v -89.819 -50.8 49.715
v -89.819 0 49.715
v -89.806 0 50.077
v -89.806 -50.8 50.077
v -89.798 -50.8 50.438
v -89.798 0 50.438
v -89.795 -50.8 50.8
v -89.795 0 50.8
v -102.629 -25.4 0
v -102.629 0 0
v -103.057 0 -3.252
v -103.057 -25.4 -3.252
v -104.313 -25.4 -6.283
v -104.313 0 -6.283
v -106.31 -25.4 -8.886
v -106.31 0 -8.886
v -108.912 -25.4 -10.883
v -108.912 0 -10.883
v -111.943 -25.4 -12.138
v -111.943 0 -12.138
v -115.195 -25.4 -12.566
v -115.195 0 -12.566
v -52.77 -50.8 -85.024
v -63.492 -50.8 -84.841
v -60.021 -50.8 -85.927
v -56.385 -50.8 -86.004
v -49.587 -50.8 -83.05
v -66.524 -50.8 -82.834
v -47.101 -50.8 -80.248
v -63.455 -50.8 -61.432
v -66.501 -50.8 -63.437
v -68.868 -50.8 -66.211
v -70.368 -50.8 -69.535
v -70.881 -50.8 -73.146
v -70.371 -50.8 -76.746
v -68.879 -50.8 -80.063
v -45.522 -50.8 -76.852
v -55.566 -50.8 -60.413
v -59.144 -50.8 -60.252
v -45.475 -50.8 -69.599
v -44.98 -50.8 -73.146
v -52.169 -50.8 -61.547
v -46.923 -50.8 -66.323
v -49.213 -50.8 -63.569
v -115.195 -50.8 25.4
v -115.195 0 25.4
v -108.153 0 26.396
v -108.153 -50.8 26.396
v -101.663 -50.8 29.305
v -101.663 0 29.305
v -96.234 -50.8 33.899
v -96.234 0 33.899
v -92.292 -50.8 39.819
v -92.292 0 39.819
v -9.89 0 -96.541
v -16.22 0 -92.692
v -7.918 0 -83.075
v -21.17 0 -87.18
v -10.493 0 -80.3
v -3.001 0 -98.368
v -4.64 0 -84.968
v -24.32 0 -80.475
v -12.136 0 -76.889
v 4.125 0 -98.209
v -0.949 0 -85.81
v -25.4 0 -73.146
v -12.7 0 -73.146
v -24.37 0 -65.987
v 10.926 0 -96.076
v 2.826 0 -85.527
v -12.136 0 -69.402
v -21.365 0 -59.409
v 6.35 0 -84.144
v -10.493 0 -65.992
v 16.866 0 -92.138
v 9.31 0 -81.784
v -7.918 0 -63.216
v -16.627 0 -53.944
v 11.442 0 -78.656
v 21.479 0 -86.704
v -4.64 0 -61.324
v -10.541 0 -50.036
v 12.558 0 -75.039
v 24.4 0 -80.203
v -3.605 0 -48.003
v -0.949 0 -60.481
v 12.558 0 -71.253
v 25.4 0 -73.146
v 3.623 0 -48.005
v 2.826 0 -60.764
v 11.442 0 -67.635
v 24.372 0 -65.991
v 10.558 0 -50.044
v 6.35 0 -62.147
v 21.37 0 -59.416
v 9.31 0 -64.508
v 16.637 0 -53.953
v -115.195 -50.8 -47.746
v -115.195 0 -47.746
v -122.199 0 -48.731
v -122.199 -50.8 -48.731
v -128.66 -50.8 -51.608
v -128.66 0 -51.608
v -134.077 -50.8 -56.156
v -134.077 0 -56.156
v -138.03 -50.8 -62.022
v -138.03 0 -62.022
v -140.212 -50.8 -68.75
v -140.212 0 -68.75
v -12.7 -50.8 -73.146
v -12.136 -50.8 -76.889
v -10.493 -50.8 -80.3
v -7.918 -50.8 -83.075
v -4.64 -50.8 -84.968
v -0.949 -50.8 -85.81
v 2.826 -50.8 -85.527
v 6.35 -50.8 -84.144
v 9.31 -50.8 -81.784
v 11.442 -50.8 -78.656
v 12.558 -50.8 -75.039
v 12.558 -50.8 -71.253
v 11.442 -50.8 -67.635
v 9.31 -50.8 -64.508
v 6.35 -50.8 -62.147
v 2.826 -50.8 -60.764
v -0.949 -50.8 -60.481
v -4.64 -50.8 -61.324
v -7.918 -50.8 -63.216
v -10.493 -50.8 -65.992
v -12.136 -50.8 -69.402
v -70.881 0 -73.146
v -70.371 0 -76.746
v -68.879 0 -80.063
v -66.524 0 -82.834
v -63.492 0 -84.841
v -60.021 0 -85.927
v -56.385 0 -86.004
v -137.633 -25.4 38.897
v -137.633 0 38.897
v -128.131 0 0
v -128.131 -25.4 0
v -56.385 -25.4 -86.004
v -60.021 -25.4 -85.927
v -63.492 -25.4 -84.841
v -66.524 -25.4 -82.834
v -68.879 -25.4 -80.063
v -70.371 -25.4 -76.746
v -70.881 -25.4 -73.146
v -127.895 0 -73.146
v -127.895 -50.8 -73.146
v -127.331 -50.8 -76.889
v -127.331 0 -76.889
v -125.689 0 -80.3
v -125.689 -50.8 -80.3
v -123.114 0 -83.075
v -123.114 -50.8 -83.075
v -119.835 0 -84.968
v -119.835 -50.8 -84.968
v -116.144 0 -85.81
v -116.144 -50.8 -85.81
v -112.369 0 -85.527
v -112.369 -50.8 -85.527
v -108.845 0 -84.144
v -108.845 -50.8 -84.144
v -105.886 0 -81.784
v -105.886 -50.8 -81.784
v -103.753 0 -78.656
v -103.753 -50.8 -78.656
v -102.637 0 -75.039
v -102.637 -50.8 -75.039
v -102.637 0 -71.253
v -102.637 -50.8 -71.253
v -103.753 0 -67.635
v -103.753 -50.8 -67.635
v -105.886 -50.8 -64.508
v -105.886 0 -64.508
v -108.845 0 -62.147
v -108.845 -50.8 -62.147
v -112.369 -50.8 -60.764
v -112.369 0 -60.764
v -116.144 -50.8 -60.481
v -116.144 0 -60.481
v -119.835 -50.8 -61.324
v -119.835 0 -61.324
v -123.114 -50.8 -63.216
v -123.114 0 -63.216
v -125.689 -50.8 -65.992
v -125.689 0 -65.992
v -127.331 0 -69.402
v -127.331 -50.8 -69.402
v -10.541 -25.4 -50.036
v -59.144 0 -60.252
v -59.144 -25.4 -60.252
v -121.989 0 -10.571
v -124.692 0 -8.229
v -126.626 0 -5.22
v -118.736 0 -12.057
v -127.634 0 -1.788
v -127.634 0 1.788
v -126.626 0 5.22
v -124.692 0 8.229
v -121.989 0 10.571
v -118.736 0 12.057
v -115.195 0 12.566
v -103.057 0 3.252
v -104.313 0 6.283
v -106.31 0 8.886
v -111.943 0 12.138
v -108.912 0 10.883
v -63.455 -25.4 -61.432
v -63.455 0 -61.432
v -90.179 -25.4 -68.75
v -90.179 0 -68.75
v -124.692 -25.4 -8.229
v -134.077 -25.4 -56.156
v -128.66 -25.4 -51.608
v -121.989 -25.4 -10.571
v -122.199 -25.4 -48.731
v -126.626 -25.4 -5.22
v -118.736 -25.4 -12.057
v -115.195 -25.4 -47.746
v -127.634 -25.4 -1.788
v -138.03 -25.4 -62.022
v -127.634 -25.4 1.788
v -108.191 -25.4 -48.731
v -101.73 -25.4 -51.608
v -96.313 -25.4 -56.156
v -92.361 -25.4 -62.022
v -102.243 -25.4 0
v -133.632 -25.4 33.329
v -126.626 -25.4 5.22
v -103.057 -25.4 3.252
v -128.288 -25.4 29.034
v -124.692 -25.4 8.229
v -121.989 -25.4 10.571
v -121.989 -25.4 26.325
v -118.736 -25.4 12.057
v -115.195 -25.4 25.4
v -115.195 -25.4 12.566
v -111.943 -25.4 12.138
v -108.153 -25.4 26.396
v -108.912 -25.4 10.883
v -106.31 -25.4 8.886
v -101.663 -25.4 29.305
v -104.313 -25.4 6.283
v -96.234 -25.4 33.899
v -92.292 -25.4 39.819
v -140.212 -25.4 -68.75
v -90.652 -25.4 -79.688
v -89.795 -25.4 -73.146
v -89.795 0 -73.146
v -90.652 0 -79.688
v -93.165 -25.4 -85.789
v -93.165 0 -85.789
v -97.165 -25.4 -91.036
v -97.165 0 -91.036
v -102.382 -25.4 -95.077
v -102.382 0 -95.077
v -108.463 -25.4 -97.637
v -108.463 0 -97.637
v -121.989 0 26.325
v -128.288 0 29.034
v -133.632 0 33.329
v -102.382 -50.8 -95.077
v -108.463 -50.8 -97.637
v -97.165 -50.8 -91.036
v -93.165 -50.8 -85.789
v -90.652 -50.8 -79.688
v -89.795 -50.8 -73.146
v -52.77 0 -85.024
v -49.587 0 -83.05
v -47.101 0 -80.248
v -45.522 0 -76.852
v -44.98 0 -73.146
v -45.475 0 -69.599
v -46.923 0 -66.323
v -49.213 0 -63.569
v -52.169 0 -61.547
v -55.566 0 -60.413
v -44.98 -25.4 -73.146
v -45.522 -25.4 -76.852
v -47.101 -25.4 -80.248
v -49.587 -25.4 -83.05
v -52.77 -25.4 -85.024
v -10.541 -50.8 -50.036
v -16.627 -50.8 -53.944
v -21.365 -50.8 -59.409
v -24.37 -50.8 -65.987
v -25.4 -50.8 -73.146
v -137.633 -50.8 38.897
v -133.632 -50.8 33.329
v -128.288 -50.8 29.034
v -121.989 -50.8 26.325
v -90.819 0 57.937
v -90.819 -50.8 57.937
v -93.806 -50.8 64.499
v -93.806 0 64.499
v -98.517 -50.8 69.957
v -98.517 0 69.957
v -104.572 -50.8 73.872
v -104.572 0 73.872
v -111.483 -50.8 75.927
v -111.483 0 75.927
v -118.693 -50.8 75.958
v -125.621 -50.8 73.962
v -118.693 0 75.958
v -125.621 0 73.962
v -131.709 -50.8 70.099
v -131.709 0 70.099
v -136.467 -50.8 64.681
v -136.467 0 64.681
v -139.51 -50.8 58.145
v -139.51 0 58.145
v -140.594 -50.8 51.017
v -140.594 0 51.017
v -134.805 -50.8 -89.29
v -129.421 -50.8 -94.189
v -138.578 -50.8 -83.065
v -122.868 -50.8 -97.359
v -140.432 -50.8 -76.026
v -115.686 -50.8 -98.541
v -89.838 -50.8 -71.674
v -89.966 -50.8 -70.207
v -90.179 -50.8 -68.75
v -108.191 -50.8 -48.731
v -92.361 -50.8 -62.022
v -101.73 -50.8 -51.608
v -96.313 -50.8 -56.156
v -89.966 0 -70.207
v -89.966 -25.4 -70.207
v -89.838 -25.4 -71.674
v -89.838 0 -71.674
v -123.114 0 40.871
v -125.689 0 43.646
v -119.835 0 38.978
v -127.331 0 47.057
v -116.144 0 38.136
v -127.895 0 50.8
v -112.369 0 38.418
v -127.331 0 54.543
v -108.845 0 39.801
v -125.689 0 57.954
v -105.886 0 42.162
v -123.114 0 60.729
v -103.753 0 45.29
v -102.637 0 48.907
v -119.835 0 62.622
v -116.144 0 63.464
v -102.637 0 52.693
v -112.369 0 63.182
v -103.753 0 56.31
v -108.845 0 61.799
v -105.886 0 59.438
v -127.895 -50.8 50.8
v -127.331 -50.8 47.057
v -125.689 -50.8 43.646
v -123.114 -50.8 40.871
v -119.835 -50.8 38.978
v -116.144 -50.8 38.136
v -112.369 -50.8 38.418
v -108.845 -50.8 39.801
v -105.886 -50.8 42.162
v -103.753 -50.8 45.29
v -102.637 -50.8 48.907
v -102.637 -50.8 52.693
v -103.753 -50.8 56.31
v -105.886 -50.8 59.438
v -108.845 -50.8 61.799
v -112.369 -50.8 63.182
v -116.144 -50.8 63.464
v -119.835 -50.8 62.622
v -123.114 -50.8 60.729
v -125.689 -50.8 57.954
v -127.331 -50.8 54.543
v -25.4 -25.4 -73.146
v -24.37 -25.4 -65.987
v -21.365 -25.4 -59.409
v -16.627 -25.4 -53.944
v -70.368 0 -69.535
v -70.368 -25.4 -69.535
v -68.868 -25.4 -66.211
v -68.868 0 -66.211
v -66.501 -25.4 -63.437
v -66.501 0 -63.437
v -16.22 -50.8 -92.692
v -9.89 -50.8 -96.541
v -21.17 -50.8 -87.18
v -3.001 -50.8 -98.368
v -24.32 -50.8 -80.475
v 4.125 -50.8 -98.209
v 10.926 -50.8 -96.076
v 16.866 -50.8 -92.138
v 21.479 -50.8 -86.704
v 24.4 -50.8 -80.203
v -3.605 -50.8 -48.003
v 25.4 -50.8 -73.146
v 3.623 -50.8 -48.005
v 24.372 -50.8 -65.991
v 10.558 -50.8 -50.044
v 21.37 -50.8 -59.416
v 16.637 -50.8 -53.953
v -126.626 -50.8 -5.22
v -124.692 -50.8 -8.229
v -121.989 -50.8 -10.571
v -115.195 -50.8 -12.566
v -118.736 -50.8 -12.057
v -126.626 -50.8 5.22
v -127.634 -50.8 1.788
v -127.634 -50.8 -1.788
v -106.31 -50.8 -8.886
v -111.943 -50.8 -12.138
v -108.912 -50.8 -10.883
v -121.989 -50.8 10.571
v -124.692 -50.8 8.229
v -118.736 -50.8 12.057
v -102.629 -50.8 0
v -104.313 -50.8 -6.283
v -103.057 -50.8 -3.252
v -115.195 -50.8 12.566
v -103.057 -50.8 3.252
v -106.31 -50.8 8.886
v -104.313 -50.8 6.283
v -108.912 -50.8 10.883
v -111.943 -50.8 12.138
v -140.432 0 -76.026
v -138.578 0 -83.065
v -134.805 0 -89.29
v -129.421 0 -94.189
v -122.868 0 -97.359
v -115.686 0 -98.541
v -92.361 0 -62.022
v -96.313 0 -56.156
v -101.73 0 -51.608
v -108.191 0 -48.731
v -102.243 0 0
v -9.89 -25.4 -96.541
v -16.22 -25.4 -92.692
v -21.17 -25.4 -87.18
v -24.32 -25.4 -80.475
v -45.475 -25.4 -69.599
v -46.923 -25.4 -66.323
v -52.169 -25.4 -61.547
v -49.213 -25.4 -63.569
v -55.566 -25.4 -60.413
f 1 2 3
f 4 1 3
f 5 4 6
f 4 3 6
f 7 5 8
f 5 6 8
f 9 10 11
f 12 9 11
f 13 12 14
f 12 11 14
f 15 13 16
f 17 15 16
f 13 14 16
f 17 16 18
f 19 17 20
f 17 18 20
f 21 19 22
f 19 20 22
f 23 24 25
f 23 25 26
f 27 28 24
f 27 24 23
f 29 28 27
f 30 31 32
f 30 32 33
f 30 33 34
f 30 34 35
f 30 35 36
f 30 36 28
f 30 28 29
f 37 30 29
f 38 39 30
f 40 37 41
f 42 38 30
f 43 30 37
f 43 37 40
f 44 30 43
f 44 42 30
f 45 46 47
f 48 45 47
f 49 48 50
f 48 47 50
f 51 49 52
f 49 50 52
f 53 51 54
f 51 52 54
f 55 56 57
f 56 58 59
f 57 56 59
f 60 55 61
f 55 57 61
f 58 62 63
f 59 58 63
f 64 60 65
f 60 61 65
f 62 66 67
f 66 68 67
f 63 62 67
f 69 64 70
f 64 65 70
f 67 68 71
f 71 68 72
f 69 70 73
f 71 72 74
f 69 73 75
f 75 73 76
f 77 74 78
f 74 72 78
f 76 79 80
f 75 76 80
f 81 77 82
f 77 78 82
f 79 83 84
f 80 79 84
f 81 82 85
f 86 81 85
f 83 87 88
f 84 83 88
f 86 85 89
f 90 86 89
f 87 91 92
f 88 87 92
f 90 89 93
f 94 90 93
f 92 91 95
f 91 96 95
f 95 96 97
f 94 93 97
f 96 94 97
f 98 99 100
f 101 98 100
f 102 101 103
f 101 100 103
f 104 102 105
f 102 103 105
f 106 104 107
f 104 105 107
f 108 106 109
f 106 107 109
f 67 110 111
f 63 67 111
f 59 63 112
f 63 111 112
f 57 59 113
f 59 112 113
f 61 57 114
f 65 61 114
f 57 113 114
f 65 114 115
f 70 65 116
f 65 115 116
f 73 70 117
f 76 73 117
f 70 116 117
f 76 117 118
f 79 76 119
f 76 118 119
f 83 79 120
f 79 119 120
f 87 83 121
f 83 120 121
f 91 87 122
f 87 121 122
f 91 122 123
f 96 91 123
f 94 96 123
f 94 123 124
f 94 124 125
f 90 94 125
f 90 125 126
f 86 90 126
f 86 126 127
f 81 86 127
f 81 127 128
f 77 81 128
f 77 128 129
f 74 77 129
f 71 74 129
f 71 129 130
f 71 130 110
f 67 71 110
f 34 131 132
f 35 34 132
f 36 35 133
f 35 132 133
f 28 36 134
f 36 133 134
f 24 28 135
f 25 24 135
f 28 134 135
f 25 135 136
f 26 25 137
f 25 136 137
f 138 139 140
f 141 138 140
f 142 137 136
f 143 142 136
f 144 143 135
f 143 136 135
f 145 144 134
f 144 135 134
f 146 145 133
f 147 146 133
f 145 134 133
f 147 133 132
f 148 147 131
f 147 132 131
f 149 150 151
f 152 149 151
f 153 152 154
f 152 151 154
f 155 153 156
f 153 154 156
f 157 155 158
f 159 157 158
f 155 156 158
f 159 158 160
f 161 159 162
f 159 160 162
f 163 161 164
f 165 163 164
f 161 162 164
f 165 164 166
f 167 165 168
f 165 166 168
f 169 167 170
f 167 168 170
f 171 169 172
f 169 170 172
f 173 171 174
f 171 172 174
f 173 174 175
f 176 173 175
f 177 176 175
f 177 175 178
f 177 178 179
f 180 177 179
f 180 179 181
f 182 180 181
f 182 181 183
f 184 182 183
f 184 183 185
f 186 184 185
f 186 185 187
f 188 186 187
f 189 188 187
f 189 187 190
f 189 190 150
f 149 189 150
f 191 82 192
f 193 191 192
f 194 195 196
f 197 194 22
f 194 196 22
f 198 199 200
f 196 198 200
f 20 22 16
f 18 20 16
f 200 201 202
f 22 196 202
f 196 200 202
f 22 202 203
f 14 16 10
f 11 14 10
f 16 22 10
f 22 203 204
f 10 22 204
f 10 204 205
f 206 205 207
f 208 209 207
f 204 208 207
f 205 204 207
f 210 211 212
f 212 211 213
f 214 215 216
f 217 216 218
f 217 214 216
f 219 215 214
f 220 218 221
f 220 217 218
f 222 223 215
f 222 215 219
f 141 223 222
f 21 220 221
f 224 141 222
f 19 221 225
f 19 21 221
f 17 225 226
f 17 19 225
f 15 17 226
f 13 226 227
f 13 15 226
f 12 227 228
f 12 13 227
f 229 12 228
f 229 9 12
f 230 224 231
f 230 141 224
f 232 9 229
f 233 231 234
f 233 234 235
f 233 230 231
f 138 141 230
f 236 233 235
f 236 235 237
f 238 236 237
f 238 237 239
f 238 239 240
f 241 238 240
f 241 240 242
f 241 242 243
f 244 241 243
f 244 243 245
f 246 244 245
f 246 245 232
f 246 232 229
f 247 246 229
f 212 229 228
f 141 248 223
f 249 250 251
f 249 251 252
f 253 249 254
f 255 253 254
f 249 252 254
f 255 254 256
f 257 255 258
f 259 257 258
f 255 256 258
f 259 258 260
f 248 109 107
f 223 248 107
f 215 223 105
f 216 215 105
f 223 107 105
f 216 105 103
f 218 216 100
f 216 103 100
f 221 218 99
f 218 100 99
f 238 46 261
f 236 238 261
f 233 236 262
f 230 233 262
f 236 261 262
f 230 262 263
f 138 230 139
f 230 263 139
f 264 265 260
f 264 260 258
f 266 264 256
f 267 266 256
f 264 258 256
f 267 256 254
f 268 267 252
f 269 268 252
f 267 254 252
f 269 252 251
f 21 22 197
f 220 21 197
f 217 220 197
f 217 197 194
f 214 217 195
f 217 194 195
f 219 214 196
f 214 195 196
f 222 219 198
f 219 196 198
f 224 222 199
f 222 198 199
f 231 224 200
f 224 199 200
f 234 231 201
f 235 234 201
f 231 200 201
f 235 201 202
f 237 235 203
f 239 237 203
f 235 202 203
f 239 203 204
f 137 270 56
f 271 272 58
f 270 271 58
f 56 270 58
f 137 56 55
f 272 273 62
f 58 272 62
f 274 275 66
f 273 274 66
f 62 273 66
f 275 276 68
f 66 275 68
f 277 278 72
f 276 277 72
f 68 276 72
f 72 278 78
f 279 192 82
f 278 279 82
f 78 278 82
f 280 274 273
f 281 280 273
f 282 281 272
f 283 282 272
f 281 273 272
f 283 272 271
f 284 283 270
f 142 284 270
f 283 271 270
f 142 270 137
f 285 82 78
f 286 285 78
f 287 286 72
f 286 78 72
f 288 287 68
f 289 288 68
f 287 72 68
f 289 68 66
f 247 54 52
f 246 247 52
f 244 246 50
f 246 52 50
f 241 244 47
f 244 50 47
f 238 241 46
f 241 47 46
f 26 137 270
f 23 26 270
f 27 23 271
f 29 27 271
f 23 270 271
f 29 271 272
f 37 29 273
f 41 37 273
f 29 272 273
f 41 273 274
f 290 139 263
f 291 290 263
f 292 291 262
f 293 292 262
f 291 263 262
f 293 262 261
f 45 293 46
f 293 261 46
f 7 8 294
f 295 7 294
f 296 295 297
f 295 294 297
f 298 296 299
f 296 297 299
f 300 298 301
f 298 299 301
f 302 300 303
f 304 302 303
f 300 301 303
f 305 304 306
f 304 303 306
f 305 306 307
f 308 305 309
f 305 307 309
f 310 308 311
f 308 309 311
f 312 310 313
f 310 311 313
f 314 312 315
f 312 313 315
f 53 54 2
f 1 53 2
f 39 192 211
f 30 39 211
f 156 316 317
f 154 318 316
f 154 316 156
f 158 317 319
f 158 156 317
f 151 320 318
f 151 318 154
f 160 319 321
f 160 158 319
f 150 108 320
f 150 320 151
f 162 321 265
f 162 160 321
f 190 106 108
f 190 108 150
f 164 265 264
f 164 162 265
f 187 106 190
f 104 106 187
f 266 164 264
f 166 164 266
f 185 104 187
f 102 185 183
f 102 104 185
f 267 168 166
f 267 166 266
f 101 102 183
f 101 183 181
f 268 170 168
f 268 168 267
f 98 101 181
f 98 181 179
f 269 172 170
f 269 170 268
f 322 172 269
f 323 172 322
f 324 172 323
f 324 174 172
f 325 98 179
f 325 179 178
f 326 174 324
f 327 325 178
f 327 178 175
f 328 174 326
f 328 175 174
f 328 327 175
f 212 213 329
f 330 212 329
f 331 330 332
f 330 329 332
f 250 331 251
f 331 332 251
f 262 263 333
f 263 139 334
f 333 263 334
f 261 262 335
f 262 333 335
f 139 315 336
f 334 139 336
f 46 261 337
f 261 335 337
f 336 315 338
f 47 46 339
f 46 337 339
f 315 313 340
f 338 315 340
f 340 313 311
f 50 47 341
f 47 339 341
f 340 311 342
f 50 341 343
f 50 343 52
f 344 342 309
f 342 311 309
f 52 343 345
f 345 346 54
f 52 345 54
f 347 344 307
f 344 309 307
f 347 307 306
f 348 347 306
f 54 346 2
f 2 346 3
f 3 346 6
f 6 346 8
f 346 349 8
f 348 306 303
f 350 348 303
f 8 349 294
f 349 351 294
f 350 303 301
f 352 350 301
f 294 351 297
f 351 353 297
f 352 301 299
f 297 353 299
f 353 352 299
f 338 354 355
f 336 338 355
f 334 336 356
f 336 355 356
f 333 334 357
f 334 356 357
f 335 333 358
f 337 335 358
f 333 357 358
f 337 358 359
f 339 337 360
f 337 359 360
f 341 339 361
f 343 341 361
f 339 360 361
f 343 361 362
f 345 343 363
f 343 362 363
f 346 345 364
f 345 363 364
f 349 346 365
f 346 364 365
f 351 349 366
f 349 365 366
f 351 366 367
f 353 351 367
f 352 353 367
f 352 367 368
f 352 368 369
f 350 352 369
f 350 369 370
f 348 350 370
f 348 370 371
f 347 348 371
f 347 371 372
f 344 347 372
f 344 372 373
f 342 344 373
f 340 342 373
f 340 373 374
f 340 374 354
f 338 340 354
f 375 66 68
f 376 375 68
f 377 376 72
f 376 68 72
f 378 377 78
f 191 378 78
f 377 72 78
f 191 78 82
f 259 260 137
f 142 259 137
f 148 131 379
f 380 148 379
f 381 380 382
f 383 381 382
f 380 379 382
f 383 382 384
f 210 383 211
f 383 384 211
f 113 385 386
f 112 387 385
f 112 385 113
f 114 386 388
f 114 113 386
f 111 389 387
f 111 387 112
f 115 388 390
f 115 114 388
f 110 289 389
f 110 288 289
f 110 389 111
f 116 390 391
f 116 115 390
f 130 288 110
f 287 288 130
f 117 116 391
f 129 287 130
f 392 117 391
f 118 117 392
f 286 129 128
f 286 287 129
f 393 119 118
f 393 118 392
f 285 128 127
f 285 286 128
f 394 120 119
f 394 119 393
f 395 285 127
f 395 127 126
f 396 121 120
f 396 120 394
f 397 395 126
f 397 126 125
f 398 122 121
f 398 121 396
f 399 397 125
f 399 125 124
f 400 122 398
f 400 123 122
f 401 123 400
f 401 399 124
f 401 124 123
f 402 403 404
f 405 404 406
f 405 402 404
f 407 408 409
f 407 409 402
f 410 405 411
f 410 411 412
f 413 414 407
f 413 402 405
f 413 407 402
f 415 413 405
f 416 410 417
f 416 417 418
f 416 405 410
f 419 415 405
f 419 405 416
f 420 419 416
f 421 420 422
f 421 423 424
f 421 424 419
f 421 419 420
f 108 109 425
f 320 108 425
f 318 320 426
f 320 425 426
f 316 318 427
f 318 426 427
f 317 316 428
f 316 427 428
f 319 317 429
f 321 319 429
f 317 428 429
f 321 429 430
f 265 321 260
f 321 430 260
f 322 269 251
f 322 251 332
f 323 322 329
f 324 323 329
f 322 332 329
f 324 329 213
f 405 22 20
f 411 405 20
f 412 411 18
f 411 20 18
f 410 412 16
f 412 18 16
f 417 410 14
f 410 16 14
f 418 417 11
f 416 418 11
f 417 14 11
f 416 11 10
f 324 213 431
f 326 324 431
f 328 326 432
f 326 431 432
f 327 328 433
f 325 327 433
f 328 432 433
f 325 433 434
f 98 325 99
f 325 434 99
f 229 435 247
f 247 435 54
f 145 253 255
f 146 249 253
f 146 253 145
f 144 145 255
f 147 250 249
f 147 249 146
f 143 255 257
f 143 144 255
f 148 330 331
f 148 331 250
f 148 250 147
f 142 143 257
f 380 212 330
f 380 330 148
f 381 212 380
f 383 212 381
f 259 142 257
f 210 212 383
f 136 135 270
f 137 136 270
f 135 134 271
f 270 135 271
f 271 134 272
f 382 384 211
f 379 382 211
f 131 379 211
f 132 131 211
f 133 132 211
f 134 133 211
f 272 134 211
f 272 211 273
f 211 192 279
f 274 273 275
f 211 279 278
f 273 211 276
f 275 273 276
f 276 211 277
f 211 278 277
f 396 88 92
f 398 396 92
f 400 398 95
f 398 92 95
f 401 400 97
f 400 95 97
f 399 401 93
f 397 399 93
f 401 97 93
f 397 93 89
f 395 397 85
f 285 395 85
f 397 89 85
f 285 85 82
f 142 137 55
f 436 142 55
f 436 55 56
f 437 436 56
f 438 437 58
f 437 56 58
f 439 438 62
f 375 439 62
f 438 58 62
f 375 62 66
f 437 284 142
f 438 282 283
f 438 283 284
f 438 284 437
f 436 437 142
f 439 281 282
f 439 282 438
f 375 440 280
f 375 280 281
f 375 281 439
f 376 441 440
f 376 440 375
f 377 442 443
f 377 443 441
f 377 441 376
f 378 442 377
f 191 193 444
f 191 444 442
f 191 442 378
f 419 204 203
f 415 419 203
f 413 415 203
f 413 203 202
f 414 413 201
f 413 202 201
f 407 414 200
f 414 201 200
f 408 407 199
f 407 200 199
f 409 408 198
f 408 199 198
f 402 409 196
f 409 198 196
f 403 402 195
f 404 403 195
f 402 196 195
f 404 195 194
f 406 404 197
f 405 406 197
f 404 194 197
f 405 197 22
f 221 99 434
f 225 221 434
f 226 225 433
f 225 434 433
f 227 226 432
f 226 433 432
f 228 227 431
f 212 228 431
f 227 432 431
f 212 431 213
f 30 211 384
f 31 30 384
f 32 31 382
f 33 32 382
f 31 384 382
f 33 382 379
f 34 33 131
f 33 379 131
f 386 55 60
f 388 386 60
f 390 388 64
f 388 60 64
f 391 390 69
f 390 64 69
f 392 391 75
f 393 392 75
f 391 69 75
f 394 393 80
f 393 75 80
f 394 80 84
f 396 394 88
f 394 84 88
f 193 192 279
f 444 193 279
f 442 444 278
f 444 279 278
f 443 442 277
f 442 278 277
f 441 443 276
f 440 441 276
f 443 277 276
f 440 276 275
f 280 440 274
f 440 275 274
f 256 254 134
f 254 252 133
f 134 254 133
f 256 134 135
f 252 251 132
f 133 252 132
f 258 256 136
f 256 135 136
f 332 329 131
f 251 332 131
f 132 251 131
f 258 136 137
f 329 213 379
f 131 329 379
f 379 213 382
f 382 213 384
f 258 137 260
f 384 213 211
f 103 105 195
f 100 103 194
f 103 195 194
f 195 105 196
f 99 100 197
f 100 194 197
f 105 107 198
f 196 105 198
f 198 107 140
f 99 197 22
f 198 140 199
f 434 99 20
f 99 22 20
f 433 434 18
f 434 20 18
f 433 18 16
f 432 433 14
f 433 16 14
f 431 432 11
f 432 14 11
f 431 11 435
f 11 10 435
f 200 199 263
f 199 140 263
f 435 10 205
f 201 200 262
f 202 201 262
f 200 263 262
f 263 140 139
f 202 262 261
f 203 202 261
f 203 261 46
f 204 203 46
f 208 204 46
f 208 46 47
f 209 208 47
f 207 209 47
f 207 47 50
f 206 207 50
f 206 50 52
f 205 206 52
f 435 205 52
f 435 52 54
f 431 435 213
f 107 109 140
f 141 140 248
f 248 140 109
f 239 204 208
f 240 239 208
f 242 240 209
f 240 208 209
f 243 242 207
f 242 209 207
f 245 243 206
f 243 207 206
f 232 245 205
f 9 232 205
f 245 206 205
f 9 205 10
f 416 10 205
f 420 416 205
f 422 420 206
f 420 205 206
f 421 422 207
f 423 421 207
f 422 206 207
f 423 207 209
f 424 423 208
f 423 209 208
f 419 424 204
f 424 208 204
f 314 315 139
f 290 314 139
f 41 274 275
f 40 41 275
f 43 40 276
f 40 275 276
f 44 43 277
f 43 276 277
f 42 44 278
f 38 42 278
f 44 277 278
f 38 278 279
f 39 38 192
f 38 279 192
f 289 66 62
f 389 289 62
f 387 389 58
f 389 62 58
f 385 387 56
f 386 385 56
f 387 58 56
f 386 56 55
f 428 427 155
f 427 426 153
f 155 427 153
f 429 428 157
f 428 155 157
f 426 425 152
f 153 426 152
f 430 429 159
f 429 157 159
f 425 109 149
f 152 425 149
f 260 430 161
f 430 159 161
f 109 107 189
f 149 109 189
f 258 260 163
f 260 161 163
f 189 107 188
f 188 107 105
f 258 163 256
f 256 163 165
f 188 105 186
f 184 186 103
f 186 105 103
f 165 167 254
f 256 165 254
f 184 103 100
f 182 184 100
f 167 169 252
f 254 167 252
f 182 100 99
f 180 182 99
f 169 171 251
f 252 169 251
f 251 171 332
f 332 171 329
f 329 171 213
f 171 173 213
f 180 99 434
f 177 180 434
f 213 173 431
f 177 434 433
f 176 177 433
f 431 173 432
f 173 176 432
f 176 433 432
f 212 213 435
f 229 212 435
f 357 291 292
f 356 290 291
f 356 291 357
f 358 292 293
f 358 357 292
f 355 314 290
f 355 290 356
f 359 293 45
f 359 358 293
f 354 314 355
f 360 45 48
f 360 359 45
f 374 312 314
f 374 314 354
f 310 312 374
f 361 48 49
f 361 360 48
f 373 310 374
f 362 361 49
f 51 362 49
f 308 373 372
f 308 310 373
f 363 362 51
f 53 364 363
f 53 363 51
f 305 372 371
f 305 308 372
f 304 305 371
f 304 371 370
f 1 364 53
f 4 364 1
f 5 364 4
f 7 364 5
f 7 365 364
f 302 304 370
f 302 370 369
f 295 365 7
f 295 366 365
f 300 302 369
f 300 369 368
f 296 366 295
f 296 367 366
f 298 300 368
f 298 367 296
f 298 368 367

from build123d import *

# Parameters (mm, degrees)
F1_DEPTH = 50.8
F2_DEPTH = 25.4
F3_D     = 25.4
F3_2_D   = 25.4
F3_3_D   = 25.4


# Not quite as in the source:
# - ends of sketch curves that miss each other by under 0.0002 mm in the source are joined


with BuildPart() as f1:
    # F0 (on Front) → F1 (new body)
    with BuildSketch(Plane.XZ):
        with BuildLine():
            ThreePointArc((-115.1953488588, 25.4), (-101.6630890972, 29.30493206), (-92.291660437, 39.8190593902))
            Line((-92.291660437, 39.8190593902), (-89.8185141224, 49.7154453636))
            ThreePointArc((-89.8185141224, 49.7154453636), (-89.8011408351, 50.2575989978), (-89.7953488588, 50.8))
            ThreePointArc((-89.7953488588, 50.8), (-115.0868603739, 76.1997683109), (-140.5944221068, 51.0169749908))
            Line((-140.5944221068, 51.0169749908), (-137.6334657409, 38.8966008725))
            ThreePointArc((-137.6334657409, 38.8966008725), (-128.2875920234, 29.0341283446), (-115.1953488588, 25.4))
        make_face()
    extrude(amount=F1_DEPTH)

    # F3 (through all)
    with Locations(Plane(origin=(0, 0, 0), x_dir=(1, 0, 0), z_dir=(0, 1, 0))):
        with Locations((-115.1953488588, -50.8), (-115.1953488588, 73.1457510495), (0, 73.1457510495)):
            Hole(F3_D / 2)


with BuildPart() as f1b:
    # F0 (on Front) → F1, piece 2 (new body)
    with BuildSketch(Plane.XZ):
        with BuildLine():
            ThreePointArc((-115.1953488588, 12.5662939133), (-127.7616427722, 0), (-115.1953488588, -12.5662939133))
            Line((-115.1953488588, -12.5662939133), (-115.1953488588, 0))
            Line((-115.1953488588, 0), (-115.1953488588, 12.5662939133))
        make_face()
        with BuildLine():
            Line((-115.1953488588, 0), (-115.1953488588, -12.5662939133))
            ThreePointArc((-115.1953488588, -12.5662939133), (-106.3096372183, -8.8857116405), (-102.6290549455, 0))
            ThreePointArc((-102.6290549455, 0), (-106.3096372183, 8.8857116405), (-115.1953488588, 12.5662939133))
            Line((-115.1953488588, 12.5662939133), (-115.1953488588, 0))
        make_face()
    extrude(amount=F1_DEPTH)


with BuildPart() as f1c:
    # F0 (on Front) → F1, piece 3 (new body)
    with BuildSketch(Plane.XZ):
        with BuildLine():
            ThreePointArc((-108.4626208204, -97.6371857392), (-94.9942190368, -88.5429700813), (-89.7953488588, -73.1457510495))
            Line((-89.7953488588, -73.1457510495), (-115.1953488588, -73.1457510495))
            Line((-115.1953488588, -73.1457510495), (-115.1953488588, -47.7457510495))
            ThreePointArc((-115.1953488588, -47.7457510495), (-131.5278604467, -53.6930117763), (-140.212048827, -68.7497616611))
            ThreePointArc((-140.212048827, -68.7497616611), (-132.2891116058, -91.9330679189), (-108.4626208204, -97.6371857392))
        make_face()
        with BuildLine():
            Line((-115.1953488588, -73.1457510495), (-89.7953488588, -73.1457510495))
            ThreePointArc((-89.7953488588, -73.1457510495), (-89.891355303, -70.9394169576), (-90.1786488687, -68.7497617861))
            ThreePointArc((-90.1786488687, -68.7497617861), (-98.8628372224, -53.6930118171), (-115.1953488588, -47.7457510495))
            Line((-115.1953488588, -47.7457510495), (-115.1953488588, -73.1457510495))
        make_face()
    extrude(amount=F1_DEPTH)

    # F3#2 (through all)
    with Locations(Plane(origin=(0, 0, 0), x_dir=(1, 0, 0), z_dir=(0, 1, 0))):
        with Locations((-115.1953488588, -50.8), (-115.1953488588, 73.1457510495), (0, 73.1457510495)):
            Hole(F3_2_D / 2)


with BuildPart() as f1d:
    # F0 (on Front) → F1, piece 4 (new body)
    with BuildSketch(Plane.XZ):
        with BuildLine():
            ThreePointArc((-63.4545843049, -61.4323040872), (-68.8681180563, -66.2110512717), (-70.8812527568, -73.1457510495))
            Line((-70.8812527568, -73.1457510495), (-57.930611074, -73.1457510495))
            Line((-57.930611074, -73.1457510495), (-44.9799693912, -73.1457510495))
            ThreePointArc((-44.9799693912, -73.1457510495), (-49.2128317892, -63.5687241446), (-59.1444326796, -60.2521186247))
            Line((-59.1444326796, -60.2521186247), (-63.4545843049, -61.4323040872))
        make_face()
        with BuildLine():
            Line((-57.930611074, -73.1457510495), (-70.8812527568, -73.1457510495))
            ThreePointArc((-70.8812527568, -73.1457510495), (-66.5244411037, -82.8341567706), (-56.385414216, -86.0038802551))
            ThreePointArc((-56.385414216, -86.0038802551), (-48.2422053529, -81.7395810792), (-44.9799693912, -73.1457510495))
            Line((-44.9799693912, -73.1457510495), (-57.930611074, -73.1457510495))
        make_face()
    extrude(amount=F1_DEPTH)


with BuildPart() as f1e:
    # F0 (on Front) → F1, piece 5 (new body)
    with BuildSketch(Plane.XZ):
        with BuildLine():
            ThreePointArc((-25.4, -73.1457510495), (-21.170469895, -87.1803940597), (-9.8904563446, -96.5410256428))
            ThreePointArc((-9.8904563446, -96.5410256428), (14.0346430102, -94.3162209445), (25.4, -73.1457510495))
            ThreePointArc((25.4, -73.1457510495), (13.7371971399, -51.7810742502), (-10.5408987984, -50.0362410478))
            ThreePointArc((-10.5408987984, -50.0362410478), (-21.3646767993, -59.4085539097), (-25.4, -73.1457510495))
        make_face()
    extrude(amount=F1_DEPTH)

    # F3#3 (through all)
    with Locations(Plane(origin=(0, 0, 0), x_dir=(1, 0, 0), z_dir=(0, 1, 0))):
        with Locations((-115.1953488588, -50.8), (-115.1953488588, 73.1457510495), (0, 73.1457510495)):
            Hole(F3_3_D / 2)


with BuildPart() as f2:
    # F0 (on Front) → F2 (new body)
    with BuildSketch(Plane.XZ):
        with BuildLine():
            ThreePointArc((-140.212048827, -68.7497616611), (-131.5278604467, -53.6930117763), (-115.1953488588, -47.7457510495))
            Line((-115.1953488588, -47.7457510495), (-115.1953488588, -12.5662939133))
            ThreePointArc((-115.1953488588, -12.5662939133), (-127.7616427722, 0), (-115.1953488588, 12.5662939133))
            Line((-115.1953488588, 12.5662939133), (-115.1953488588, 25.4))
            ThreePointArc((-115.1953488588, 25.4), (-128.2875920234, 29.0341283446), (-137.6334657409, 38.8966008725))
            Line((-137.6334657409, 38.8966008725), (-128.1311899166, 0))
            Line((-128.1311899166, 0), (-140.212048827, -68.7497616611))
        make_face()
        with BuildLine():
            ThreePointArc((-115.1953488588, -47.7457510495), (-98.8628372224, -53.6930118171), (-90.1786488687, -68.7497617861))
            Line((-90.1786488687, -68.7497617861), (-102.2426021492, 0))
            Line((-102.2426021492, 0), (-92.291660437, 39.8190593902))
            ThreePointArc((-92.291660437, 39.8190593902), (-101.6630890972, 29.30493206), (-115.1953488588, 25.4))
            Line((-115.1953488588, 25.4), (-115.1953488588, 12.5662939133))
            ThreePointArc((-115.1953488588, 12.5662939133), (-106.3096372183, 8.8857116405), (-102.6290549455, 0))
            ThreePointArc((-102.6290549455, 0), (-106.3096372183, -8.8857116405), (-115.1953488588, -12.5662939133))
            Line((-115.1953488588, -12.5662939133), (-115.1953488588, -47.7457510495))
        make_face()
    extrude(amount=F2_DEPTH)


with BuildPart() as f2b:
    # F0 (on Front) → F2, piece 2 (new body)
    with BuildSketch(Plane.XZ):
        with BuildLine():
            ThreePointArc((-90.1786488687, -68.7497617861), (-89.891355303, -70.9394169576), (-89.7953488588, -73.1457510495))
            Line((-89.7953488588, -73.1457510495), (-70.8812527568, -73.1457510495))
            ThreePointArc((-70.8812527568, -73.1457510495), (-68.8681180563, -66.2110512717), (-63.4545843049, -61.4323040872))
            Line((-63.4545843049, -61.4323040872), (-90.1786488687, -68.7497617861))
        make_face()
        with BuildLine():
            Line((-70.8812527568, -73.1457510495), (-89.7953488588, -73.1457510495))
            ThreePointArc((-89.7953488588, -73.1457510495), (-94.9942190368, -88.5429700813), (-108.4626208204, -97.6371857392))
            Line((-108.4626208204, -97.6371857392), (-56.385414216, -86.0038802551))
            ThreePointArc((-56.385414216, -86.0038802551), (-66.5244411037, -82.8341567706), (-70.8812527568, -73.1457510495))
        make_face()
    extrude(amount=F2_DEPTH)


with BuildPart() as f2c:
    # F0 (on Front) → F2, piece 3 (new body)
    with BuildSketch(Plane.XZ):
        with BuildLine():
            ThreePointArc((-59.1444326796, -60.2521186247), (-49.2128317892, -63.5687241446), (-44.9799693912, -73.1457510495))
            Line((-44.9799693912, -73.1457510495), (-25.4, -73.1457510495))
            ThreePointArc((-25.4, -73.1457510495), (-21.3646767993, -59.4085539097), (-10.5408987984, -50.0362410478))
            Line((-10.5408987984, -50.0362410478), (-59.1444326796, -60.2521186247))
        make_face()
        with BuildLine():
            ThreePointArc((-44.9799693912, -73.1457510495), (-48.2422053529, -81.7395810792), (-56.385414216, -86.0038802551))
            Line((-56.385414216, -86.0038802551), (-9.8904563446, -96.5410256428))
            ThreePointArc((-9.8904563446, -96.5410256428), (-21.170469895, -87.1803940597), (-25.4, -73.1457510495))
            Line((-25.4, -73.1457510495), (-44.9799693912, -73.1457510495))
        make_face()
    extrude(amount=F2_DEPTH)


solid = Compound([f1.part, f1b.part, f1c.part, f1d.part, f1e.part, f2.part, f2b.part, f2c.part])
